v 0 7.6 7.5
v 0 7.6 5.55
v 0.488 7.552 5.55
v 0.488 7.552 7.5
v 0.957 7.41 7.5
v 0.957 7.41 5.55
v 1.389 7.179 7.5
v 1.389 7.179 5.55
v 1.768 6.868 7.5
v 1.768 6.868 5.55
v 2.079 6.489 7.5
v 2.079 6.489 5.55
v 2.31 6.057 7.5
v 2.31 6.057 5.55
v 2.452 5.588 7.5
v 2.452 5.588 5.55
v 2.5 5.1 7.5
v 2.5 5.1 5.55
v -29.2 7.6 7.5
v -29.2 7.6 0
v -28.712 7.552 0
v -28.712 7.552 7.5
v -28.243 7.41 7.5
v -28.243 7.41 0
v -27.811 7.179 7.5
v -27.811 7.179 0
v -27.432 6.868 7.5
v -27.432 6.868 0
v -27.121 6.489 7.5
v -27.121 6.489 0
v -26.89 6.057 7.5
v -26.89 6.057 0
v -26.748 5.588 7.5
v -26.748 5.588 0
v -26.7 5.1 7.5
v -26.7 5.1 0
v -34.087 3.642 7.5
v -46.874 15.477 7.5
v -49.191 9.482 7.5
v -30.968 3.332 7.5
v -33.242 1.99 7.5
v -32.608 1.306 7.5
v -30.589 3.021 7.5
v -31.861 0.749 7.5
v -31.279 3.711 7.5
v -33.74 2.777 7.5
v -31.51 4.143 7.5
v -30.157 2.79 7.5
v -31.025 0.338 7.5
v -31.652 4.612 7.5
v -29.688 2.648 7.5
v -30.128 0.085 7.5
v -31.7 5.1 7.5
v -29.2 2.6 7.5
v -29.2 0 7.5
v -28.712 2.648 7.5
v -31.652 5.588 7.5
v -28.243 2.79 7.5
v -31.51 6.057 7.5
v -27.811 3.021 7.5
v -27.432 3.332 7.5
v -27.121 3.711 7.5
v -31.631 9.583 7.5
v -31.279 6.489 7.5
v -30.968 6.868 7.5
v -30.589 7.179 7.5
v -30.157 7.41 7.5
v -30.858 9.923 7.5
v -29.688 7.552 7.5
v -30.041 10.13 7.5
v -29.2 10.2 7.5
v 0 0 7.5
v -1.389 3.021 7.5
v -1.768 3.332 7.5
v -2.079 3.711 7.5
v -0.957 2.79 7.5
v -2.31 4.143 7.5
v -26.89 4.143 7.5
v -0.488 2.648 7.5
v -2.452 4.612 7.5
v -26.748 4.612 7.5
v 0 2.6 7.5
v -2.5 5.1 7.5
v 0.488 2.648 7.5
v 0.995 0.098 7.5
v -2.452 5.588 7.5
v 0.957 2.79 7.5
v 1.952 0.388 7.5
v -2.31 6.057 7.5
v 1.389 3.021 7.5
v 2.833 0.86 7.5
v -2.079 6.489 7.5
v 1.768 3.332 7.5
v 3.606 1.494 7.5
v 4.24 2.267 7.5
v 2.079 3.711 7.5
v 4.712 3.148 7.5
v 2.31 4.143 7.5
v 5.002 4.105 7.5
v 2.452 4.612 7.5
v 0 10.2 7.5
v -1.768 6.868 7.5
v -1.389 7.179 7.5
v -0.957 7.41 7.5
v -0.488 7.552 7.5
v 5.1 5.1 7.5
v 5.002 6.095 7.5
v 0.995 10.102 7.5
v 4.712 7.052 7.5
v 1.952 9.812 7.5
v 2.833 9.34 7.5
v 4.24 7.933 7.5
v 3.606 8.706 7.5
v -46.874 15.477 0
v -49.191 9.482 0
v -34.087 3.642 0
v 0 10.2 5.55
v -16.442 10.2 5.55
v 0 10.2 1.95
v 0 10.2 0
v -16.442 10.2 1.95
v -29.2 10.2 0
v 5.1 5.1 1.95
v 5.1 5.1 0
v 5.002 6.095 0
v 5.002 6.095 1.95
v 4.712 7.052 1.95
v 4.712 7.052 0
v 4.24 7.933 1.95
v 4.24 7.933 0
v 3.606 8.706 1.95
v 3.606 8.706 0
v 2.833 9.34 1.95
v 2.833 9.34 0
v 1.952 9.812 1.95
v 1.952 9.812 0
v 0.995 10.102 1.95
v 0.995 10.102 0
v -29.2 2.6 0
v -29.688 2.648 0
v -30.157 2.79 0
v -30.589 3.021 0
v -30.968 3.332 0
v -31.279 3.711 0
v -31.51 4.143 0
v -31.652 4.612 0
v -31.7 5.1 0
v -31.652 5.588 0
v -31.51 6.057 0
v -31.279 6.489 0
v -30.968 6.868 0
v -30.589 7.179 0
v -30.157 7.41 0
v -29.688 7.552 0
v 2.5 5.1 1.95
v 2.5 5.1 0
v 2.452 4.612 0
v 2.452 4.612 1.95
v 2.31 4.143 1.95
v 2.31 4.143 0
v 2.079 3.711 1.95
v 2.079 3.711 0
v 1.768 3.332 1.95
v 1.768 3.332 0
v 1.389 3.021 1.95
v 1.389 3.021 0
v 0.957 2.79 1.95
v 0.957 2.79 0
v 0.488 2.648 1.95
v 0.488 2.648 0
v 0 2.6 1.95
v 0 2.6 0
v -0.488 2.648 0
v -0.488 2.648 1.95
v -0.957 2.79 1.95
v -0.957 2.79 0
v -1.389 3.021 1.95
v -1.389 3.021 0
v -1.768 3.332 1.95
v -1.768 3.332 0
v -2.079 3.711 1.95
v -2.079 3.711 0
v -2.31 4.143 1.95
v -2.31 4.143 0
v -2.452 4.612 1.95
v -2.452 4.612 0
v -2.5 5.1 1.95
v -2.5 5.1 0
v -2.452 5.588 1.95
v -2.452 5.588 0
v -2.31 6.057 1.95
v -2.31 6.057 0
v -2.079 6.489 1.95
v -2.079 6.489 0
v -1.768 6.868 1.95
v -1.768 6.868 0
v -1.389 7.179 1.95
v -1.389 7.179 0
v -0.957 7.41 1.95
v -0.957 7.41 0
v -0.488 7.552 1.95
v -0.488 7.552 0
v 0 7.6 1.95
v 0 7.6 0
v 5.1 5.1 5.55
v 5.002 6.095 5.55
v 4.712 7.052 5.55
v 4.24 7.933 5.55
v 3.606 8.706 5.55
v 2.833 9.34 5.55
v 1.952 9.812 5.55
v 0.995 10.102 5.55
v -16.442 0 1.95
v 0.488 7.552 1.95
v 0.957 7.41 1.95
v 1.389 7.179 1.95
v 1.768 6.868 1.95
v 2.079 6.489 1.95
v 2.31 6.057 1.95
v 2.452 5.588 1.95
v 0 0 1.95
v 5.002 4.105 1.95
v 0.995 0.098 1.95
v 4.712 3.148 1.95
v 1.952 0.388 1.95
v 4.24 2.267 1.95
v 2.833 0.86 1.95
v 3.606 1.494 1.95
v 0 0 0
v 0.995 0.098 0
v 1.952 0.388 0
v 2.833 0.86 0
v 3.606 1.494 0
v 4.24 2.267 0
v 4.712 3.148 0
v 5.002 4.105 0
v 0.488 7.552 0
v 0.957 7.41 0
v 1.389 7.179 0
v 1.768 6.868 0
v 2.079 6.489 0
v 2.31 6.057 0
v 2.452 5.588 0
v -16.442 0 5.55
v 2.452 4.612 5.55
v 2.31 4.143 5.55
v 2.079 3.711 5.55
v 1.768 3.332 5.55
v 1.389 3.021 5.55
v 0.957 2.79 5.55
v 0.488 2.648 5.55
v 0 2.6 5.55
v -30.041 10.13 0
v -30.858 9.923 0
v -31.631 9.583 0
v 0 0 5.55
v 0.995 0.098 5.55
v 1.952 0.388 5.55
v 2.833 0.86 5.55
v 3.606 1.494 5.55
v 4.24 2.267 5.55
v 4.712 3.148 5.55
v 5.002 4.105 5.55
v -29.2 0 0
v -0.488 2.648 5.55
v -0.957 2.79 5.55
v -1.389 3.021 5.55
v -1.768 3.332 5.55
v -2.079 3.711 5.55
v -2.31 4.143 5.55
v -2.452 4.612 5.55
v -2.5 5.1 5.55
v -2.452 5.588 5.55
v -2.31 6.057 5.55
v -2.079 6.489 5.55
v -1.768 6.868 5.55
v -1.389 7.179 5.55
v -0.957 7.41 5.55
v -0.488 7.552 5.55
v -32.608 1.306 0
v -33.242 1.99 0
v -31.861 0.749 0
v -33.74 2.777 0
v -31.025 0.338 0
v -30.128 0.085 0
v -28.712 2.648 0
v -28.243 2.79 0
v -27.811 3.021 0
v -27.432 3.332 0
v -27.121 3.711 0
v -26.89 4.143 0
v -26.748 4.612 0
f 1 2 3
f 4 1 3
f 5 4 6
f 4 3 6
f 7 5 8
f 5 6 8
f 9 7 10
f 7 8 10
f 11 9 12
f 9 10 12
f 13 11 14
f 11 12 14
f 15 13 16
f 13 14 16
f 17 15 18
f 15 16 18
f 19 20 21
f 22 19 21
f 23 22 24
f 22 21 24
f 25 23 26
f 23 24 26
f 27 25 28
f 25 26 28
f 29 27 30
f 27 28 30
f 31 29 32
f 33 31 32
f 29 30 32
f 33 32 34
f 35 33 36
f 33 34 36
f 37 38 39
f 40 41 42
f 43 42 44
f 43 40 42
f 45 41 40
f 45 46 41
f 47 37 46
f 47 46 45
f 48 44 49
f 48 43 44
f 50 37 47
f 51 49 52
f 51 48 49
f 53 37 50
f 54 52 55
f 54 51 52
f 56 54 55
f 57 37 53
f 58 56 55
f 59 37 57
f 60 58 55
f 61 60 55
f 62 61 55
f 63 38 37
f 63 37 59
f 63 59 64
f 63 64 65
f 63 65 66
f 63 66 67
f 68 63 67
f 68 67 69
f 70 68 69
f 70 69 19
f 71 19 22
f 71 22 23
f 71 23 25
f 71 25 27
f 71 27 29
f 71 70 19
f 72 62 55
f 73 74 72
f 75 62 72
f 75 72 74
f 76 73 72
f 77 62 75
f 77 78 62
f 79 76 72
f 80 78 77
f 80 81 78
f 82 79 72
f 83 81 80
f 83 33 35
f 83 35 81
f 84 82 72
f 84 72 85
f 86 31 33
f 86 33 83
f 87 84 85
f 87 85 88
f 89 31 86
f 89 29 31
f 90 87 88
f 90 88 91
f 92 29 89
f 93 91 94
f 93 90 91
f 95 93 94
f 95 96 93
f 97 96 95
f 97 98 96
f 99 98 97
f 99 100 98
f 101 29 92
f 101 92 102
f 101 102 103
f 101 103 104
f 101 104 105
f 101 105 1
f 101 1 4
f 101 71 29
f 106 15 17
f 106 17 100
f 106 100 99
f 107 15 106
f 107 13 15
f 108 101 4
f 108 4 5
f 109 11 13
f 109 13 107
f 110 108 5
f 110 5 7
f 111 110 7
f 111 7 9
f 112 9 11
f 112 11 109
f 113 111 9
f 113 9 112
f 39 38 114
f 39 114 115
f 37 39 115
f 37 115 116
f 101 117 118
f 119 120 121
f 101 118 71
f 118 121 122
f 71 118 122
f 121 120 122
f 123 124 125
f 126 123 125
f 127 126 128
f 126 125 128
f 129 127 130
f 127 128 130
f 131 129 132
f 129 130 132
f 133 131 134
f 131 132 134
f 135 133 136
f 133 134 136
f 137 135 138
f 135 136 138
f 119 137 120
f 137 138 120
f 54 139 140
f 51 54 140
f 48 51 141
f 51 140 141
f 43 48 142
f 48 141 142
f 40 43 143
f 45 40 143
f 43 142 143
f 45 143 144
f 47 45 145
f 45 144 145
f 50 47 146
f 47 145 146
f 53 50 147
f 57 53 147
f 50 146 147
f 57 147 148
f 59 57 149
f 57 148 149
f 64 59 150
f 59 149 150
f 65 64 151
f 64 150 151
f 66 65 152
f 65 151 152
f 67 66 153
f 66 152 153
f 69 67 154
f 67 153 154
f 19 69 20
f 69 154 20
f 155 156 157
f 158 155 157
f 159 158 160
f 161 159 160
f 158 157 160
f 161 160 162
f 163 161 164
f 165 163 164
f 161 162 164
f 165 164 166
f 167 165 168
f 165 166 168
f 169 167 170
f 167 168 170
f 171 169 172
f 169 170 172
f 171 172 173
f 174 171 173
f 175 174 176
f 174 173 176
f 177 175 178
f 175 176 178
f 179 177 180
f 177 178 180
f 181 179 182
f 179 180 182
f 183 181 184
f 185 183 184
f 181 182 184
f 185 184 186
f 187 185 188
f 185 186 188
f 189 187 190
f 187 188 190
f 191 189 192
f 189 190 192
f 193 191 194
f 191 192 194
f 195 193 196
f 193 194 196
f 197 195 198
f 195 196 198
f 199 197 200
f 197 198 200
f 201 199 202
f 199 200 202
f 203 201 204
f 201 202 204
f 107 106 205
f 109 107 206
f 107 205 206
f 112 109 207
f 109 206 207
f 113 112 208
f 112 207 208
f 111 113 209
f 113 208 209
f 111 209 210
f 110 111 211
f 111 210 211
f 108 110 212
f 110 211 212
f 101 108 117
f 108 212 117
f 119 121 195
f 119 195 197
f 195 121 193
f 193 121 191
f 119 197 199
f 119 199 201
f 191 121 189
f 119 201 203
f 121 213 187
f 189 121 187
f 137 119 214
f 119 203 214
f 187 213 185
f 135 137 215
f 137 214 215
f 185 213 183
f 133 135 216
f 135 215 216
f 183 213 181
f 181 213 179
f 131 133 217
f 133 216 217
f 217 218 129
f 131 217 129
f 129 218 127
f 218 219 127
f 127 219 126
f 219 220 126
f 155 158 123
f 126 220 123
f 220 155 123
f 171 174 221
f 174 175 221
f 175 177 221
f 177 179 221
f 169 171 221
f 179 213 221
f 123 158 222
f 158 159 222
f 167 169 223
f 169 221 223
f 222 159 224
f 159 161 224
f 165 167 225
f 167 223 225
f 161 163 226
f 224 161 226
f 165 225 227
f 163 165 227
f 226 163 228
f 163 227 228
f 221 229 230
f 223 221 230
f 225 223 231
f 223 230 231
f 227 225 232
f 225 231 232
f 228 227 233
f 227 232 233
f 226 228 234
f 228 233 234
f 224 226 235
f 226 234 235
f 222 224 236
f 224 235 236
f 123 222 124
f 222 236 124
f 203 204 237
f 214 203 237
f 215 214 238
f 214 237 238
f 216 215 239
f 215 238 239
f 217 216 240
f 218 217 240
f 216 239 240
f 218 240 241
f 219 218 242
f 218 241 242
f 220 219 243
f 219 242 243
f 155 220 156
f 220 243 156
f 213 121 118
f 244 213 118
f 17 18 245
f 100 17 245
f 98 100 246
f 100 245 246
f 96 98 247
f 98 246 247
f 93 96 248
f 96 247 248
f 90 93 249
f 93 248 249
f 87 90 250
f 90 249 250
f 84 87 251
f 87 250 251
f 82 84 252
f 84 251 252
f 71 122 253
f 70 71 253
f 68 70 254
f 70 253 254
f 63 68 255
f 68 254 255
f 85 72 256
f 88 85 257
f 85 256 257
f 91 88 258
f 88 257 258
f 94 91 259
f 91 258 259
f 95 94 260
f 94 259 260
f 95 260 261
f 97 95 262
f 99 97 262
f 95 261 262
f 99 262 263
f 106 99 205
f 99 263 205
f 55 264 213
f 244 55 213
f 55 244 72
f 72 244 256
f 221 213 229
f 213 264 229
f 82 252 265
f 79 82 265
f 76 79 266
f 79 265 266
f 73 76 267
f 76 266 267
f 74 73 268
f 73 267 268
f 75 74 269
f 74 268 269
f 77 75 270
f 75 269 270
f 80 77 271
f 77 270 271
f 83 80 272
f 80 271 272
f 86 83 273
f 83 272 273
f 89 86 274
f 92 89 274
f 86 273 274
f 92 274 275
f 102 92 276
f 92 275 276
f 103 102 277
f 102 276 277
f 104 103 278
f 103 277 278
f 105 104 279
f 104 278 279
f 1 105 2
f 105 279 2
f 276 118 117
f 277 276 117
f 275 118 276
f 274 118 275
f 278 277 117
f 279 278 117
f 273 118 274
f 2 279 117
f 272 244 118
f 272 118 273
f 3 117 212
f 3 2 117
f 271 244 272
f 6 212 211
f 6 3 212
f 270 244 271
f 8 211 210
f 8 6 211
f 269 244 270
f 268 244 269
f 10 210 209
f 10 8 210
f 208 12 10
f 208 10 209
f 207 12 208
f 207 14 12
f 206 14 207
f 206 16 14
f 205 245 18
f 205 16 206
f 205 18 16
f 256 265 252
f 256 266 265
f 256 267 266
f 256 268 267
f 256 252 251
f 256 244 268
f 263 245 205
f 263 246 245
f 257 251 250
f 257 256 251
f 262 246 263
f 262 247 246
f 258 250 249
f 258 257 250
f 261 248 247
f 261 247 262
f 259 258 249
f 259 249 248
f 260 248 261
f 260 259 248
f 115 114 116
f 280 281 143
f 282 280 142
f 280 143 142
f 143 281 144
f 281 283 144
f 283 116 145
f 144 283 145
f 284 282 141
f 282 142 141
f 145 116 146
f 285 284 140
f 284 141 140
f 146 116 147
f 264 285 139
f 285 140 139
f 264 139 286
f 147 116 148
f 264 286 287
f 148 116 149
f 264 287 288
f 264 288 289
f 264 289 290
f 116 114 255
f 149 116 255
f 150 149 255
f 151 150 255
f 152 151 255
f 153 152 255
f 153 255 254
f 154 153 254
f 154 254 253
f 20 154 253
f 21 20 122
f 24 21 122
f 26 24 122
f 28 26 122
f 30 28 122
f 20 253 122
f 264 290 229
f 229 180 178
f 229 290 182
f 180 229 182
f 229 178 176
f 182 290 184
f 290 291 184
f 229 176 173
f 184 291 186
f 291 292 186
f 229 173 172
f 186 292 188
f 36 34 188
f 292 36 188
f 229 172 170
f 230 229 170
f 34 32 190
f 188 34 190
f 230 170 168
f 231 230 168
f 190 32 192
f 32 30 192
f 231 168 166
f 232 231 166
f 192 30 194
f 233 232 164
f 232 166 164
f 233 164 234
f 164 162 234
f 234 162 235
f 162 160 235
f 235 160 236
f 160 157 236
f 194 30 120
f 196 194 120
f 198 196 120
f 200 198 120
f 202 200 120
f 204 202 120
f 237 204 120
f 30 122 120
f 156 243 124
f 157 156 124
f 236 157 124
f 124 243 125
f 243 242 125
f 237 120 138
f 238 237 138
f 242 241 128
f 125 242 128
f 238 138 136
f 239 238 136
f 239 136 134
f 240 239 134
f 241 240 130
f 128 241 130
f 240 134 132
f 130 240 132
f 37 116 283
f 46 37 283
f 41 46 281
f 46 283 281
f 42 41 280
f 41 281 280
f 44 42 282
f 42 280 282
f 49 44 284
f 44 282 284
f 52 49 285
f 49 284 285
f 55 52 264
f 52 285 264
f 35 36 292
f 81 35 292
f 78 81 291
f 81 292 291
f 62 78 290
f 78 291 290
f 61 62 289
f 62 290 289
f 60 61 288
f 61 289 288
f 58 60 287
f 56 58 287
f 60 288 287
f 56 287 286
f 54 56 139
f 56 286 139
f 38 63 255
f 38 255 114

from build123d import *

# Parameters (mm, degrees)
F1_DEPTH = 7.5
F2_W     = 28.4275773028
F2_H     = 3.6
F3_DEPTH = 10.201
F5_DEPTH = 7.5


with BuildPart() as f1:
    # F0 (on Top) → F1 (new body)
    with BuildSketch(Plane.XY):
        with BuildLine():
            ThreePointArc((0, 10.2), (-5.1, 5.1), (0, 0))
            Line((0, 0), (0, 2.6))
            ThreePointArc((0, 2.6), (-2.5, 5.1), (0, 7.6))
            Line((0, 7.6), (0, 10.2))
        make_face()
        with BuildLine():
            Line((-29.2, 0), (0, 0))
            ThreePointArc((0, 0), (-5.1, 5.1), (0, 10.2))
            Line((0, 10.2), (-29.2, 10.2))
            ThreePointArc((-29.2, 10.2), (-25.5937554159, 8.7062445841), (-24.1, 5.1))
            ThreePointArc((-24.1, 5.1), (-25.5937554159, 1.4937554159), (-29.2, 0))
        make_face()
        with BuildLine():
            Line((0, 2.6), (0, 0))
            ThreePointArc((0, 0), (3.6062445841, 1.4937554159), (5.1, 5.1))
            ThreePointArc((5.1, 5.1), (3.6062445841, 8.7062445841), (0, 10.2))
            Line((0, 10.2), (0, 7.6))
            ThreePointArc((0, 7.6), (1.767766953, 6.867766953), (2.5, 5.1))
            ThreePointArc((2.5, 5.1), (1.767766953, 3.332233047), (0, 2.6))
        make_face()
        with BuildLine():
            ThreePointArc((-29.2, 10.2), (-34.3, 5.1), (-29.2, 0))
            Line((-29.2, 0), (-29.2, 2.6))
            ThreePointArc((-29.2, 2.6), (-31.7, 5.1), (-29.2, 7.6))
            Line((-29.2, 7.6), (-29.2, 10.2))
        make_face()
        with BuildLine():
            Line((-29.2, 2.6), (-29.2, 0))
            ThreePointArc((-29.2, 0), (-25.5937554159, 1.4937554159), (-24.1, 5.1))
            ThreePointArc((-24.1, 5.1), (-25.5937554159, 8.7062445841), (-29.2, 10.2))
            Line((-29.2, 10.2), (-29.2, 7.6))
            ThreePointArc((-29.2, 7.6), (-27.432233047, 6.867766953), (-26.7, 5.1))
            ThreePointArc((-26.7, 5.1), (-27.432233047, 3.332233047), (-29.2, 2.6))
        make_face()
    extrude(amount=F1_DEPTH)

    # F2 (on face) → F3 (cut, through all)
    with BuildSketch(Plane.XZ):
        with Locations((-2.2280919366, 3.75)):
            Rectangle(F2_W, F2_H)
    extrude(amount=-F3_DEPTH, mode=Mode.SUBTRACT)

    # F4 (on face) → F5 (join)
    with BuildSketch(Plane.XY.offset(7.5)):
        with BuildLine():
            ThreePointArc((-34.0871795985, 3.6420989157), (-33.913058879, 7.0486087353), (-31.6307227456, 9.5834793335))
            Line((-31.6307227456, 9.5834793335), (-46.8735157819, 15.4770560035))
            Line((-46.8735157819, 15.4770560035), (-49.1914411807, 9.4821128467))
            Line((-49.1914411807, 9.4821128467), (-34.0871795985, 3.6420989157))
        make_face()
    extrude(amount=-F5_DEPTH)


solid = f1.part
